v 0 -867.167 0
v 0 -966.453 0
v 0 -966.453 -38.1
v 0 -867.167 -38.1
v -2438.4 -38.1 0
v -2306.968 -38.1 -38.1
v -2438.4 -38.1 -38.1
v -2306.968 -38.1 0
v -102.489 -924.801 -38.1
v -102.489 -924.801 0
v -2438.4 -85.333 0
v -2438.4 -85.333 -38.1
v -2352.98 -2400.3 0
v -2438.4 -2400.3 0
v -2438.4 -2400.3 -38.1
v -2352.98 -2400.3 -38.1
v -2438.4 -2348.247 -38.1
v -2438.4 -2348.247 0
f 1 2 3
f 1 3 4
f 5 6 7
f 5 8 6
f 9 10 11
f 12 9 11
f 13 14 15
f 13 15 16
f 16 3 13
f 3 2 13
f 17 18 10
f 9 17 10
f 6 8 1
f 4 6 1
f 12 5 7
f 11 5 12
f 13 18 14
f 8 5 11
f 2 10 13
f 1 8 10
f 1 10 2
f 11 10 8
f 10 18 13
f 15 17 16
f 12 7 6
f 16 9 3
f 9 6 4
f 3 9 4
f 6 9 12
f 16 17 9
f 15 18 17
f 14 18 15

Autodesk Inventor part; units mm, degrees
ref_plane "YZ Plane" through (0, 0, 0) normal (1, 0, 0) x (0, 1, 0)
ref_plane "XZ Plane" through (0, 0, 0) normal (0, 1, 0) x (-1, 0, 0)
ref_plane "XY Plane" through (0, 0, 0) normal (0, 0, 1) x (1, 0, 0)
sketch "Sketch1" plane through (0, 0, 0) normal (0, 0, 1) x (1, 0, 0)
  line L0 (-2438.4, -2400.3) -> (0, -2400.3) projected
  line L1 (0, -2438.4) -> (0, 2438.4) projected
  line L2 (0, -38.1) -> (-2438.4, -38.1) projected
  line L3 (-2438.4, 1219.2) -> (-2438.4, -2438.4) projected
  line L4 (-2438.4, -2348.2472) -> (-102.4888, -924.8013)
  line L5 (-102.4888, -924.8013) -> (-2438.4, -85.3332)
  line L6 (-2306.9684, -38.1) -> (0, -867.1668)
  line L7 (0, -966.4528) -> (-2352.98, -2400.3)
  line L8 (0, -867.1668) -> (0, -966.4528)
  line L9 (-2352.98, -2400.3) -> (-2438.4, -2400.3)
  line L10 (-2438.4, -2400.3) -> (-2438.4, -2348.2472)
  line L11 (-2438.4, -85.3332) -> (-2438.4, -38.1)
  line L12 (-2438.4, -38.1) -> (-2306.9684, -38.1)
  point P0 (0, 0)
extrude "Extrusion1" add sketch "Sketch1" against normal blind 38.1 contours L3 L4 L5 L2 L6 L1 L7 L0
properties part number "s58x2x4"
